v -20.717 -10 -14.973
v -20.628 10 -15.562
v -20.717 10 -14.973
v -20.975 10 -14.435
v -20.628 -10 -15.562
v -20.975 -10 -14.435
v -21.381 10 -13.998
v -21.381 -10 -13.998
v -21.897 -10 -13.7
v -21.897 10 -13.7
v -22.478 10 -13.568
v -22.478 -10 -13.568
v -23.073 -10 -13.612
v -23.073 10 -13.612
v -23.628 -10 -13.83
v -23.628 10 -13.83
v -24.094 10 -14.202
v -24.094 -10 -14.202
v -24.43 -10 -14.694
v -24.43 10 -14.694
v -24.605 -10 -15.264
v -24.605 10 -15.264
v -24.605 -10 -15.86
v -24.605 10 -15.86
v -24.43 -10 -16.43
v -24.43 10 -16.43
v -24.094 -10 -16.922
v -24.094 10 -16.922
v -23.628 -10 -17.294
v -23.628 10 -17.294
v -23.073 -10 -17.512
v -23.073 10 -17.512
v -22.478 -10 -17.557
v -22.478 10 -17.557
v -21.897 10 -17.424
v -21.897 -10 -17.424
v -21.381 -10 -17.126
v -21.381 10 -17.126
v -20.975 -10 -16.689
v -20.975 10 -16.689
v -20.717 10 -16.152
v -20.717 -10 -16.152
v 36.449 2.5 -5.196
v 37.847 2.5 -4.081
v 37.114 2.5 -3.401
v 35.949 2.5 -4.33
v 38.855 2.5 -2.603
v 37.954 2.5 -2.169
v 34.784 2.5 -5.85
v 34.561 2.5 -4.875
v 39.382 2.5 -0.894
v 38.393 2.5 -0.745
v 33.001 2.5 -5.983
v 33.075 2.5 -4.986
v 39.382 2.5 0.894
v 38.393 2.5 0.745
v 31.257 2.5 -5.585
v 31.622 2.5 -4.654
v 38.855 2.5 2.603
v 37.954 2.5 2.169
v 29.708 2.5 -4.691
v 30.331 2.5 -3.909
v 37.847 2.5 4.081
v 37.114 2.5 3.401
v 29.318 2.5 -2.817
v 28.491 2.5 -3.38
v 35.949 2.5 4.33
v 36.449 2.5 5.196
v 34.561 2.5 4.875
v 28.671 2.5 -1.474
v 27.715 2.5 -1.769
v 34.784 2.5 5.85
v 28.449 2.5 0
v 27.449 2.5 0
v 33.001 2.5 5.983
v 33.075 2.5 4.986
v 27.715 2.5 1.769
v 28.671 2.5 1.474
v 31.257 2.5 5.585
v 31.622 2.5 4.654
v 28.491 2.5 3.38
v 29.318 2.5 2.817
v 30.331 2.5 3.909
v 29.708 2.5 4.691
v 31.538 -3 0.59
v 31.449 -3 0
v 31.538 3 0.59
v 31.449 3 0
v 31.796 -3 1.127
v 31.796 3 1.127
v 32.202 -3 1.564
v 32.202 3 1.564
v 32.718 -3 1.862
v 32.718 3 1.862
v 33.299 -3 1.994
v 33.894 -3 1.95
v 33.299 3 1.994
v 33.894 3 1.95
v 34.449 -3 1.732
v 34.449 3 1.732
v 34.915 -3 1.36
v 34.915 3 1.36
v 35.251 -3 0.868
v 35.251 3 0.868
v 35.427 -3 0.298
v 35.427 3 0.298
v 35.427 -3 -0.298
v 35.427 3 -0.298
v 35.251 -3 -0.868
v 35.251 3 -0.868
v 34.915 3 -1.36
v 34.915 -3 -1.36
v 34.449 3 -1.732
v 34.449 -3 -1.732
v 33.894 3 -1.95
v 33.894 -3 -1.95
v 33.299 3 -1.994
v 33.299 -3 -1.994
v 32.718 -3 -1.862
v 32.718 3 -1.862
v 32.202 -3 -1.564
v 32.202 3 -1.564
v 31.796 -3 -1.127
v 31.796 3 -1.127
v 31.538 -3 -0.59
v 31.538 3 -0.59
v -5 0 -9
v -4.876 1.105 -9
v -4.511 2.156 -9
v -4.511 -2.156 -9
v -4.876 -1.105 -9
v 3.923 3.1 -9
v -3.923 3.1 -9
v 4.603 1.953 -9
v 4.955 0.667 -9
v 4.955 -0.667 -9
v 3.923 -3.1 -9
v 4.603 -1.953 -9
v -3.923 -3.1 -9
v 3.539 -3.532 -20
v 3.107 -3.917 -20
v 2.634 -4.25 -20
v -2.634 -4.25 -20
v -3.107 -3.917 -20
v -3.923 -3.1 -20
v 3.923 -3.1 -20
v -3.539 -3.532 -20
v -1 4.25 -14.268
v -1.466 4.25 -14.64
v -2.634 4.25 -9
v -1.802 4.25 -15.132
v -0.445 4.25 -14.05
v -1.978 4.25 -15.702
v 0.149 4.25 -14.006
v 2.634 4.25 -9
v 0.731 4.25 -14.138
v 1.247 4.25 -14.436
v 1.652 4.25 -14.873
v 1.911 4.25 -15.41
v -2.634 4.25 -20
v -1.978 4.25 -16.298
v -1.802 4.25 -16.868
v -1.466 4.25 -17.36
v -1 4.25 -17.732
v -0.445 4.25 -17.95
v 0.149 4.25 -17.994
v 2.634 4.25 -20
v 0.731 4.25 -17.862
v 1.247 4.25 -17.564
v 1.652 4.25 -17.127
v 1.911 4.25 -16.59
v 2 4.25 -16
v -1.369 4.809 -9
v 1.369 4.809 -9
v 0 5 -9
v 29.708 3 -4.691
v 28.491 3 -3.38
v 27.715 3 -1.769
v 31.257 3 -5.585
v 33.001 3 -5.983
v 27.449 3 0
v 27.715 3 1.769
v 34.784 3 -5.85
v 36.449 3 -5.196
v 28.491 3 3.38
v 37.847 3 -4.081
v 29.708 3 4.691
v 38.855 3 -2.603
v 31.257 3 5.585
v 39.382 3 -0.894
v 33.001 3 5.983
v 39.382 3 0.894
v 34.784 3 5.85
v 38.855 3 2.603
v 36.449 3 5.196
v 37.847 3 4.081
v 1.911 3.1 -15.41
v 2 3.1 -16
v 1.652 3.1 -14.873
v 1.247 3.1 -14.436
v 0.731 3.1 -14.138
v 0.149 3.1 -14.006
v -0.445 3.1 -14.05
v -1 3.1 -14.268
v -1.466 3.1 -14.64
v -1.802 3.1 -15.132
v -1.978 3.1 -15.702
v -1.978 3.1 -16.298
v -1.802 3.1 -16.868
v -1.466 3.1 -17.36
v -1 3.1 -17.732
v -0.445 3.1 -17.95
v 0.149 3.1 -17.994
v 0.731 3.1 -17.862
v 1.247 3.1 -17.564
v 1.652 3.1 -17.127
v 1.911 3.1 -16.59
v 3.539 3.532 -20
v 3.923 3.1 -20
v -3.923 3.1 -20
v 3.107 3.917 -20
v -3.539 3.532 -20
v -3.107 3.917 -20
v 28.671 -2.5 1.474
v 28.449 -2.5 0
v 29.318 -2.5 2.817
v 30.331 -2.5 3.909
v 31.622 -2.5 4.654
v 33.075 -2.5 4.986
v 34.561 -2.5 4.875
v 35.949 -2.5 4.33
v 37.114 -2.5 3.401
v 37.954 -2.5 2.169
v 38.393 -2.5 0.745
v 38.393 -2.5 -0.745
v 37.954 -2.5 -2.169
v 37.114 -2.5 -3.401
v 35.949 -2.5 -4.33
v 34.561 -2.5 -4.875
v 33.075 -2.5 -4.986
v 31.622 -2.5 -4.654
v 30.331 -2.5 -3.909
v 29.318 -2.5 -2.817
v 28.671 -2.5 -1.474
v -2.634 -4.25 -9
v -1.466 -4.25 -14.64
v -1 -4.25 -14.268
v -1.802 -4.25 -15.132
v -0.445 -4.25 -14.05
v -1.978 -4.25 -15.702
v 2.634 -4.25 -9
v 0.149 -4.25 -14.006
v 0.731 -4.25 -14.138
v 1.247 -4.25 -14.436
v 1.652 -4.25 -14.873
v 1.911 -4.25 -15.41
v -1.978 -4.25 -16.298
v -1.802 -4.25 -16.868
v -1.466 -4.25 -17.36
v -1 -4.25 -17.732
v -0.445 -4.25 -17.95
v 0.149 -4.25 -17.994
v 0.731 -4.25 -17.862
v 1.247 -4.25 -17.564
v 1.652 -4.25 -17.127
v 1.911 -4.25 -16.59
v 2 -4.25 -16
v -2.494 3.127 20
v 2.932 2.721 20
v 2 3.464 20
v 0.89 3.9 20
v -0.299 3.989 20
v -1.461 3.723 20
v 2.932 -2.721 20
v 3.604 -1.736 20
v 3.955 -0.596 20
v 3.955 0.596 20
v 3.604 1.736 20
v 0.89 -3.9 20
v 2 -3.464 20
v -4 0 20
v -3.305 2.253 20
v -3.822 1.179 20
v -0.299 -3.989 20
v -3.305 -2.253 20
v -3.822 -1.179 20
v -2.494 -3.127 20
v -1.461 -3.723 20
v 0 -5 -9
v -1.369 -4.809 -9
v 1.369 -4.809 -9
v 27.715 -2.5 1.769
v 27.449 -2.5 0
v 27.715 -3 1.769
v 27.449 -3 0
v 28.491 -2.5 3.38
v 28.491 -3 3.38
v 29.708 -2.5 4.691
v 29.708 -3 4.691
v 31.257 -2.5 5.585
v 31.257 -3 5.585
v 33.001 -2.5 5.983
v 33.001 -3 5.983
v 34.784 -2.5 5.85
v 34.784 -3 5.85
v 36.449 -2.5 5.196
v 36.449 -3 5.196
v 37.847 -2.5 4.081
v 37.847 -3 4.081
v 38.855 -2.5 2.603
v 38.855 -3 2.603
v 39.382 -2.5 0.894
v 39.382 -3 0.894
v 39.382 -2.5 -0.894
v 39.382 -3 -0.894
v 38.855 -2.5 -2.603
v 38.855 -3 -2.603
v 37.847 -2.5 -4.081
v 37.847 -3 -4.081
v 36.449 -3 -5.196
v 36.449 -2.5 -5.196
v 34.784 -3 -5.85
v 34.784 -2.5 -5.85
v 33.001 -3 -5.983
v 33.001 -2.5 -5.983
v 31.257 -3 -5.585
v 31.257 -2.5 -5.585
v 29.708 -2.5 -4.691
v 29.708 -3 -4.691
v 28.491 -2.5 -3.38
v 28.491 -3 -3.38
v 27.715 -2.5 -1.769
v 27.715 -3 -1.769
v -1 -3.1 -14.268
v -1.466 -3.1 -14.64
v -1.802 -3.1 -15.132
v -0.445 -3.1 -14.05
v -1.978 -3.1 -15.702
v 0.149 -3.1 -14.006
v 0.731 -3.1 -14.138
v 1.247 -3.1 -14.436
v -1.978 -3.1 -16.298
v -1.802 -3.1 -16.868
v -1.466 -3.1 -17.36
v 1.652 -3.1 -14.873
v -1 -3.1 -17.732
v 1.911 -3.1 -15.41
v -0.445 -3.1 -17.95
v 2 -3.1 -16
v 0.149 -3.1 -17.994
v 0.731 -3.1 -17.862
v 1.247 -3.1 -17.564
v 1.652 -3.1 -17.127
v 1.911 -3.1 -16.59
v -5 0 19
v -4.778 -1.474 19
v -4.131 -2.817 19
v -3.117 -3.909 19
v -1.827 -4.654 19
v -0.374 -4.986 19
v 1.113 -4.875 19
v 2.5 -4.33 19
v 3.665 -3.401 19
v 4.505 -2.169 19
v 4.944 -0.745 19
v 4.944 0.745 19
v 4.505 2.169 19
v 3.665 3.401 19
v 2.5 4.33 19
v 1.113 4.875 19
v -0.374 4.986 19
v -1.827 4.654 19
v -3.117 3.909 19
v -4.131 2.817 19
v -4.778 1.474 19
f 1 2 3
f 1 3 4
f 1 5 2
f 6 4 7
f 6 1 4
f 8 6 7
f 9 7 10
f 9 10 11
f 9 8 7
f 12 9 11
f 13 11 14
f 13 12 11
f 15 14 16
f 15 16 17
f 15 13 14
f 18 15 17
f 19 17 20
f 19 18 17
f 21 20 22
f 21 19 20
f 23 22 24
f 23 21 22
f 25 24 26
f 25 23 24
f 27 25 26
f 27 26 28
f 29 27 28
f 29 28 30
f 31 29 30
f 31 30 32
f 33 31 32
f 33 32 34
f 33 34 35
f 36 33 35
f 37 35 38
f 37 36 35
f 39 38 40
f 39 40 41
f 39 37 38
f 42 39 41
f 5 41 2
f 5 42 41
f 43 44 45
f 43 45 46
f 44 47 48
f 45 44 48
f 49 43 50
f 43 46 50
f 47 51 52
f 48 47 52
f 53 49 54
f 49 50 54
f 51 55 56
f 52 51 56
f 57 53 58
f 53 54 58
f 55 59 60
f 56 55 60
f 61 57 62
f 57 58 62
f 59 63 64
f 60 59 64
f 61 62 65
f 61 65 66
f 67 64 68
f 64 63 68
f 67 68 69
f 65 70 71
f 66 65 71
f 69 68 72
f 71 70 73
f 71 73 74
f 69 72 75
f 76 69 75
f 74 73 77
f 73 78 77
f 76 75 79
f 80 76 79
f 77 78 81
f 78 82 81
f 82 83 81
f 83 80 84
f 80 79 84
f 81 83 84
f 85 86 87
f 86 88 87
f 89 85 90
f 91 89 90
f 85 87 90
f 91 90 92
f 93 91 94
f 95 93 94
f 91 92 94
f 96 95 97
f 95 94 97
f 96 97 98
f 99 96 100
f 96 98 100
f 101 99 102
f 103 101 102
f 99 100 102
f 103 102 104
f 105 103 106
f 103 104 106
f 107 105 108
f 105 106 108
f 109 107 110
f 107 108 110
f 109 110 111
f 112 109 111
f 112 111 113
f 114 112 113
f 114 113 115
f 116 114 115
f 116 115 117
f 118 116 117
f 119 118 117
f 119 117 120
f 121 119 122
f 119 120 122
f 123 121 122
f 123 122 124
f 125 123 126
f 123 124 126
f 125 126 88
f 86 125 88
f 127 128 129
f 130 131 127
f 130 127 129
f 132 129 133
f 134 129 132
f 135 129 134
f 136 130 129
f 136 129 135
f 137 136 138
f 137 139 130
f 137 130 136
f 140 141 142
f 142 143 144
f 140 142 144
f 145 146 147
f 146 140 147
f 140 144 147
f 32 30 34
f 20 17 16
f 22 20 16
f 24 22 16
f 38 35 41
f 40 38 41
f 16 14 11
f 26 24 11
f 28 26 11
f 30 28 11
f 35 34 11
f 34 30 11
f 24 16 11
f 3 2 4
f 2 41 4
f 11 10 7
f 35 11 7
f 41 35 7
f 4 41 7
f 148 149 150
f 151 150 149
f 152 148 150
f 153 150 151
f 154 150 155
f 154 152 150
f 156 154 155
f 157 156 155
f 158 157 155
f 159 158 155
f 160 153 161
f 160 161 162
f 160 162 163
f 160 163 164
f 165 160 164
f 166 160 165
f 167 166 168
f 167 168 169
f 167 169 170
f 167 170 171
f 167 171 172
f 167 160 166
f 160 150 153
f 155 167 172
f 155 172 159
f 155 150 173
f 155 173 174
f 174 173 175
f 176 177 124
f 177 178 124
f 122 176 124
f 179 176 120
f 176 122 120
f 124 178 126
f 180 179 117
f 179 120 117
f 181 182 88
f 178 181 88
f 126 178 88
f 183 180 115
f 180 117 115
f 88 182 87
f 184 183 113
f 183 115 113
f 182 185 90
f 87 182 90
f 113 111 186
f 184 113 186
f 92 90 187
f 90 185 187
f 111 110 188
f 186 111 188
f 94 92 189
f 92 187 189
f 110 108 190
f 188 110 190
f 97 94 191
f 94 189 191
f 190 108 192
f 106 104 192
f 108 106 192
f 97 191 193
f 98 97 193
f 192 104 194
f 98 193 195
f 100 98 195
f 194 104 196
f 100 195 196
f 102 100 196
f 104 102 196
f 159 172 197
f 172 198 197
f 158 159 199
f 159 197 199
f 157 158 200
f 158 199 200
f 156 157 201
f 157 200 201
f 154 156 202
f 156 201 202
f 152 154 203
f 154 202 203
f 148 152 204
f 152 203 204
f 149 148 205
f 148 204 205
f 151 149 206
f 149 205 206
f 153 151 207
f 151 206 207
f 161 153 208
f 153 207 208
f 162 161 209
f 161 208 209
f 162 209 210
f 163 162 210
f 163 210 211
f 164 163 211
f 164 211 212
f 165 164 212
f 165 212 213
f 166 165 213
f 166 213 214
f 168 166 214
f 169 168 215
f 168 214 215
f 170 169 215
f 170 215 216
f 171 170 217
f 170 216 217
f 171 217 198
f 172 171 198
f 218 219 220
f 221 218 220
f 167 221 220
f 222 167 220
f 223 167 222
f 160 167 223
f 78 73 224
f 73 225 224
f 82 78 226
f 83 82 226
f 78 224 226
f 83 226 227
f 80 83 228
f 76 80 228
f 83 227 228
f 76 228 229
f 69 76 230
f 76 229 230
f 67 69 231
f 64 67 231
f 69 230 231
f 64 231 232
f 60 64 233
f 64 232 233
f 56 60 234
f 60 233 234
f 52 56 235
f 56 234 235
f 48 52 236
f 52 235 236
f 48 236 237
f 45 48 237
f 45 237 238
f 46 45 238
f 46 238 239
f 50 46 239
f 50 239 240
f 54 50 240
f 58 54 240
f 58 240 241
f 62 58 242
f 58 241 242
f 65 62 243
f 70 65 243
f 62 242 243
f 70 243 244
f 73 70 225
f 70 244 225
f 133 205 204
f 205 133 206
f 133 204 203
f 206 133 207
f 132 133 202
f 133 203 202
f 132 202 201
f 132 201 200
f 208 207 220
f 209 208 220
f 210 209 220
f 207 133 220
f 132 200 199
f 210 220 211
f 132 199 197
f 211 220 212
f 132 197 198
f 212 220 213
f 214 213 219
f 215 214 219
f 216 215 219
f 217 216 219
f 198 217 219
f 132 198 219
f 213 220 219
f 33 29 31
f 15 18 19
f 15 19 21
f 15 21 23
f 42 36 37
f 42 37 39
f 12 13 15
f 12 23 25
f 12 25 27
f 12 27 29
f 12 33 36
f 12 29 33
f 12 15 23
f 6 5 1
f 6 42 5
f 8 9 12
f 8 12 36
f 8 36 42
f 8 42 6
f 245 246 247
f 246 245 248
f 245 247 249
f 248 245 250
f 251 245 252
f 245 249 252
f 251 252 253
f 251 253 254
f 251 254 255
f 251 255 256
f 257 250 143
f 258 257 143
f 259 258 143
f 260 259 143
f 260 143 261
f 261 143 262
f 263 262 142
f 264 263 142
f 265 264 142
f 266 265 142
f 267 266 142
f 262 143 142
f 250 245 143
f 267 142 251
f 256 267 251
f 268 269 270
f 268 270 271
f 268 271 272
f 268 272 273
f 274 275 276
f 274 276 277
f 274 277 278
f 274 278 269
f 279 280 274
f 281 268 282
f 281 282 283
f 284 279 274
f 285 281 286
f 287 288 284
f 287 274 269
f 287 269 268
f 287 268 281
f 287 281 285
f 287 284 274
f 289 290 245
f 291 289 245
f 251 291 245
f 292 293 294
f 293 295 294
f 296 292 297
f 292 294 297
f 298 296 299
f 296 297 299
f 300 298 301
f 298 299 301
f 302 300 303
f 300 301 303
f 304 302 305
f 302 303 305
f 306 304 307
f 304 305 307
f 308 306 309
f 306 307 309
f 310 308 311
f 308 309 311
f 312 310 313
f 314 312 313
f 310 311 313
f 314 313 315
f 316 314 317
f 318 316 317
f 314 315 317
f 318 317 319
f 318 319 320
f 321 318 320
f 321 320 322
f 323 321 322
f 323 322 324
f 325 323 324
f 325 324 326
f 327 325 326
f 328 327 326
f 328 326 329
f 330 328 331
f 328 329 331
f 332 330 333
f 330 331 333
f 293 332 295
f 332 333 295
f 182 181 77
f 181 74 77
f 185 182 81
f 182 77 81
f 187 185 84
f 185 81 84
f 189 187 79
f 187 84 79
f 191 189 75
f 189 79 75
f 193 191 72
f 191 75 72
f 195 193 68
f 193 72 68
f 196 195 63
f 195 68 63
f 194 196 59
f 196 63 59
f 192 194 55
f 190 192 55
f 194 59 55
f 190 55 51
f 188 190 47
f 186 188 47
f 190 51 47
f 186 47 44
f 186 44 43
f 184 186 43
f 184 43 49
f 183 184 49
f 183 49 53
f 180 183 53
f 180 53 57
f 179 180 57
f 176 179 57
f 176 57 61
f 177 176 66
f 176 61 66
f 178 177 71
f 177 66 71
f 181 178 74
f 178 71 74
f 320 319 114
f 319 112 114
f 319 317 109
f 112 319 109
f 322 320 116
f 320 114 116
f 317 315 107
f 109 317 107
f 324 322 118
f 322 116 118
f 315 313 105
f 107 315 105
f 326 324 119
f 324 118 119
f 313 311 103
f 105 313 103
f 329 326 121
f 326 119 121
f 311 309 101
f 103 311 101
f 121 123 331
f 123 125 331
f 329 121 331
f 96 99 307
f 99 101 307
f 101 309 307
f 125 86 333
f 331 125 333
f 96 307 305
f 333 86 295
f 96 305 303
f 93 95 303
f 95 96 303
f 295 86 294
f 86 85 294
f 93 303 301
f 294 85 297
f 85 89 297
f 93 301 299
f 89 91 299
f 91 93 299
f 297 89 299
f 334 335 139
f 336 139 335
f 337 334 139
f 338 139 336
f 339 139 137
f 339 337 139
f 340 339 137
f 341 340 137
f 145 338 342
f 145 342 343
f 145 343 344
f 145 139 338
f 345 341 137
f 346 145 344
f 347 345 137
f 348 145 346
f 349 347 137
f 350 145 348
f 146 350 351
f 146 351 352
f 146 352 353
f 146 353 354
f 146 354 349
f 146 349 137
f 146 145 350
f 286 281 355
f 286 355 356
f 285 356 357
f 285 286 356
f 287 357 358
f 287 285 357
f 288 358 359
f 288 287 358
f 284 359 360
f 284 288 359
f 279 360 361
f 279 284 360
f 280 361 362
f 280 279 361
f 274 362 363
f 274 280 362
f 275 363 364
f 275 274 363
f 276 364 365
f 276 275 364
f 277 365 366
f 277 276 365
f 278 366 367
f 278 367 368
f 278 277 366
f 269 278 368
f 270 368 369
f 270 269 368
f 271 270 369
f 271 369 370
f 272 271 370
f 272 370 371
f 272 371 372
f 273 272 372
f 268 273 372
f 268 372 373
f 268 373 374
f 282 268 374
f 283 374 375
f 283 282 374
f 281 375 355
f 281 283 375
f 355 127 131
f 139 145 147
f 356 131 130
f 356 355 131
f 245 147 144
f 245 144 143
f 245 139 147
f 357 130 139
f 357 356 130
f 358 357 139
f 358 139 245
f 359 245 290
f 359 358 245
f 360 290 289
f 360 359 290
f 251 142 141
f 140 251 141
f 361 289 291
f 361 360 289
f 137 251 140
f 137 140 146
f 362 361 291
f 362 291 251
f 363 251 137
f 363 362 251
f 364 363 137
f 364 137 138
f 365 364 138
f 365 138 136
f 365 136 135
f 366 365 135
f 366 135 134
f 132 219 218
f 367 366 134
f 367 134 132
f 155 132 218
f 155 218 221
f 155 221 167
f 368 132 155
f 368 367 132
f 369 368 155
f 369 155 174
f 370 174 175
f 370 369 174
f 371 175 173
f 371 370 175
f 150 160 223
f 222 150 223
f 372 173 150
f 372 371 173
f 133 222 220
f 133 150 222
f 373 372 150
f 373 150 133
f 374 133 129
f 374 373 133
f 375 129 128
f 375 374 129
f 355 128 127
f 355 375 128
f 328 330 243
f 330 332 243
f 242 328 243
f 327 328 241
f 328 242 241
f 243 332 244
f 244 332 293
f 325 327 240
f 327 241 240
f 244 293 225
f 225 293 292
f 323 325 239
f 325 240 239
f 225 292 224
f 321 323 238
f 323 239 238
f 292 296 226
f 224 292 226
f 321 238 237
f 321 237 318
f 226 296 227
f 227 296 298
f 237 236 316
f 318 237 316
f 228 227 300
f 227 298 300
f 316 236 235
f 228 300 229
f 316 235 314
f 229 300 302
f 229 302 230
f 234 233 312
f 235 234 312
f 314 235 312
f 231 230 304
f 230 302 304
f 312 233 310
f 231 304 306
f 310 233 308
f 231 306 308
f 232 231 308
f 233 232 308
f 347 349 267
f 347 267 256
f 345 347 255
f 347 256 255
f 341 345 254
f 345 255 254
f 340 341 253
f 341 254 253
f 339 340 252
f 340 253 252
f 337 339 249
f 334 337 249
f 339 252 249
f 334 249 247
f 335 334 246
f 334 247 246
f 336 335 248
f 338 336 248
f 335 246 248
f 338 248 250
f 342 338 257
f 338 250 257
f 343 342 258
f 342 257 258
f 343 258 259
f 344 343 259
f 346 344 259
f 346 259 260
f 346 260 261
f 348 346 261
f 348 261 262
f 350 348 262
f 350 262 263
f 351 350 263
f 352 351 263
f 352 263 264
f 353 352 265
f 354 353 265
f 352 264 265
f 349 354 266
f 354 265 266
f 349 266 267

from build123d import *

# Parameters (mm, degrees)
F0_W      = 5
F0_H      = 40
F2_W      = 18
F2_H      = 6.2
F2_W_2    = 8.9579941705
F2_H_2    = 2.2900672629
F3_DEPTH  = 11
F4_R      = 2
F5_DEPTH  = 12.5
F6_R      = 2
F7_DEPTH  = 10
F10_SIZE  = 1
F11_DEPTH = 10


with BuildPart() as f1:
    # F0 (on Front) → F1 (revolve)
    with BuildSketch(Plane.XZ):
        with Locations((-2.5, 0)):
            Rectangle(F0_W, F0_H)
    revolve(axis=Axis((0, 0, 0), (0, 0, 1)))

    # F2 (on face) → F3 (cut)
    with BuildSketch(Plane(origin=(0, 0, -20), x_dir=(1, 0, 0), z_dir=(0, 0, -1))):
        Rectangle(F2_W, F2_H)
        with Locations((0, -5.3950336315)):
            Rectangle(F2_W_2, F2_H_2)
        with Locations((0, 5.3950336315)):
            Rectangle(F2_W_2, F2_H_2)
    extrude(amount=-F3_DEPTH, mode=Mode.SUBTRACT)

    # F4 (on face) → F5 (cut, symmetric)
    with BuildSketch(Plane.XZ.offset(-3.1)):
        with Locations((0, -16)):
            Circle(F4_R)
    extrude(amount=F5_DEPTH, both=True, mode=Mode.SUBTRACT)

    # F10
    f10_edges = [f1.edges().sort_by_distance(p)[0] for p in [
        (5, 0, 20),
    ]]
    chamfer(f10_edges, length=F10_SIZE)

    # F2 (on face) → F11 (cut)
    with BuildSketch(Plane(origin=(0, 0, -20), x_dir=(1, 0, 0), z_dir=(0, 0, -1))):
        Rectangle(F2_W, F2_H)
        with Locations((0, -5.3950336315)):
            Rectangle(F2_W_2, F2_H_2)
        with Locations((0, 5.3950336315)):
            Rectangle(F2_W_2, F2_H_2)
    extrude(amount=-F11_DEPTH, mode=Mode.SUBTRACT)


with BuildPart() as f7:
    # F6 (on Front) → F7 (new body, symmetric)
    with BuildSketch(Plane.XZ):
        with Locations((-22.6276665926, -15.5621189624)):
            Circle(F6_R)
    extrude(amount=F7_DEPTH, both=True)


with BuildPart() as f9:
    # F8 (on Top) → F9 (revolve)
    with BuildSketch(Plane.XY):
        Polygon((27.4488952756, -3), (31.4488952756, -3), (31.4488952756, 3), (27.4488952756, 3), (27.4488952756, 2.5), (28.4488952756, 2.5), (28.4488952756, -2.5), (27.4488952756, -2.5), align=None)
    revolve(axis=Axis((33.4488952756, -1.0138176493, 0), (0, 1, 0)))


solid = Compound([f1.part, f7.part, f9.part])
